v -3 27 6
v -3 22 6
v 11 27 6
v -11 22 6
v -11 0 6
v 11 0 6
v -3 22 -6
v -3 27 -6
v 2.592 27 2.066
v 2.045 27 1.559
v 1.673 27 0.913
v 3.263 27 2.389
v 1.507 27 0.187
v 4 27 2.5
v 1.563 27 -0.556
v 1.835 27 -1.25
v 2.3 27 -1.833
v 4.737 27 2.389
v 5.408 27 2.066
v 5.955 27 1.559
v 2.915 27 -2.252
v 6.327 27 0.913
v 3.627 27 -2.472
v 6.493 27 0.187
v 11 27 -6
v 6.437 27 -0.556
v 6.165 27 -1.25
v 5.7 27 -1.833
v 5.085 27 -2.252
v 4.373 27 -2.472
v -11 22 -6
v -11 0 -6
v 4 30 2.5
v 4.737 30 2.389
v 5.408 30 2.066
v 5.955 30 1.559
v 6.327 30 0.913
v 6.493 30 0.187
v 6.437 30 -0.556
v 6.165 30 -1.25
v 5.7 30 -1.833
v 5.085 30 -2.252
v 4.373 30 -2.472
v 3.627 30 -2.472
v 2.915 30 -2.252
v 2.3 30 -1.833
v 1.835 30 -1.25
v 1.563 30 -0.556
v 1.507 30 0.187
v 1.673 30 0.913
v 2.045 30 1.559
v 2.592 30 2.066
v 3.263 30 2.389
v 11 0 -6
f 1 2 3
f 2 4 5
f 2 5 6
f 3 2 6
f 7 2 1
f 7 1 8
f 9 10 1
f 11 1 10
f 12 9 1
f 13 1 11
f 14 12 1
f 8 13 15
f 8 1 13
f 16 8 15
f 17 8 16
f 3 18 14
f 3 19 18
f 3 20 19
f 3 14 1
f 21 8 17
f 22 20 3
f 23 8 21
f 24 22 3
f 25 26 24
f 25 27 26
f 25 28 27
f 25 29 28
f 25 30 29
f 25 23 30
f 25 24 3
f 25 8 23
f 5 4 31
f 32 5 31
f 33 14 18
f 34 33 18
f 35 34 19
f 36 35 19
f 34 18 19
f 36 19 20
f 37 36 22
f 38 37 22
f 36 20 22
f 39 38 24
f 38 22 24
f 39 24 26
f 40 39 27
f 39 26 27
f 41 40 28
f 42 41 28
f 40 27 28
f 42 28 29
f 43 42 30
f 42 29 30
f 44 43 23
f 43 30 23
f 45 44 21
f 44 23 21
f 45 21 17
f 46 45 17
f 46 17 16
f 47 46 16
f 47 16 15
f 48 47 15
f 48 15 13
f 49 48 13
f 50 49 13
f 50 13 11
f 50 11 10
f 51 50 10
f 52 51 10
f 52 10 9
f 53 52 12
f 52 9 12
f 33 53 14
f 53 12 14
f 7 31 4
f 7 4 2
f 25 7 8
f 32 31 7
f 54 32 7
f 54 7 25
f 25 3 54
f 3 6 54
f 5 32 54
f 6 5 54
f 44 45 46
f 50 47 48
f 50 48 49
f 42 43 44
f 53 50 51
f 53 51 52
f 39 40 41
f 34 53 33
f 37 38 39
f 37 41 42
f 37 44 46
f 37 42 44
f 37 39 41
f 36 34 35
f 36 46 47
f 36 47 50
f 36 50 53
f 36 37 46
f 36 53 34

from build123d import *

# Parameters (mm, degrees)
CROQUIS1_W              = 22
CROQUIS1_H              = 12
SALIENTE_EXTRUIR1_DEPTH = 22
CROQUIS2_W              = 14
CROQUIS2_H              = 12
SALIENTE_EXTRUIR2_DEPTH = 5
CROQUIS3_R              = 2.5
SALIENTE_EXTRUIR3_DEPTH = 3


with BuildPart() as part:
    # Croquis1 → Saliente-Extruir1 (new body)
    with BuildSketch(Plane(origin=(0, 0, 0), x_dir=(1, 0, 0), z_dir=(0, 1, 0))):
        Rectangle(CROQUIS1_W, CROQUIS1_H)
    extrude(amount=SALIENTE_EXTRUIR1_DEPTH)

    # Croquis2 → Saliente-Extruir2 (add)
    with BuildSketch(Plane(origin=(0, 22, 0), x_dir=(1, 0, 0), z_dir=(0, 1, 0))):
        with Locations((4, 0)):
            Rectangle(CROQUIS2_W, CROQUIS2_H)
    extrude(amount=SALIENTE_EXTRUIR2_DEPTH)

    # Croquis3 → Saliente-Extruir3 (add)
    with BuildSketch(Plane(origin=(0, 27, 0), x_dir=(1, 0, 0), z_dir=(0, 1, 0))):
        with Locations(Location((4, 0, 0), (0, 0, 270))):
            Circle(CROQUIS3_R)
    extrude(amount=SALIENTE_EXTRUIR3_DEPTH)


solid = part.part
